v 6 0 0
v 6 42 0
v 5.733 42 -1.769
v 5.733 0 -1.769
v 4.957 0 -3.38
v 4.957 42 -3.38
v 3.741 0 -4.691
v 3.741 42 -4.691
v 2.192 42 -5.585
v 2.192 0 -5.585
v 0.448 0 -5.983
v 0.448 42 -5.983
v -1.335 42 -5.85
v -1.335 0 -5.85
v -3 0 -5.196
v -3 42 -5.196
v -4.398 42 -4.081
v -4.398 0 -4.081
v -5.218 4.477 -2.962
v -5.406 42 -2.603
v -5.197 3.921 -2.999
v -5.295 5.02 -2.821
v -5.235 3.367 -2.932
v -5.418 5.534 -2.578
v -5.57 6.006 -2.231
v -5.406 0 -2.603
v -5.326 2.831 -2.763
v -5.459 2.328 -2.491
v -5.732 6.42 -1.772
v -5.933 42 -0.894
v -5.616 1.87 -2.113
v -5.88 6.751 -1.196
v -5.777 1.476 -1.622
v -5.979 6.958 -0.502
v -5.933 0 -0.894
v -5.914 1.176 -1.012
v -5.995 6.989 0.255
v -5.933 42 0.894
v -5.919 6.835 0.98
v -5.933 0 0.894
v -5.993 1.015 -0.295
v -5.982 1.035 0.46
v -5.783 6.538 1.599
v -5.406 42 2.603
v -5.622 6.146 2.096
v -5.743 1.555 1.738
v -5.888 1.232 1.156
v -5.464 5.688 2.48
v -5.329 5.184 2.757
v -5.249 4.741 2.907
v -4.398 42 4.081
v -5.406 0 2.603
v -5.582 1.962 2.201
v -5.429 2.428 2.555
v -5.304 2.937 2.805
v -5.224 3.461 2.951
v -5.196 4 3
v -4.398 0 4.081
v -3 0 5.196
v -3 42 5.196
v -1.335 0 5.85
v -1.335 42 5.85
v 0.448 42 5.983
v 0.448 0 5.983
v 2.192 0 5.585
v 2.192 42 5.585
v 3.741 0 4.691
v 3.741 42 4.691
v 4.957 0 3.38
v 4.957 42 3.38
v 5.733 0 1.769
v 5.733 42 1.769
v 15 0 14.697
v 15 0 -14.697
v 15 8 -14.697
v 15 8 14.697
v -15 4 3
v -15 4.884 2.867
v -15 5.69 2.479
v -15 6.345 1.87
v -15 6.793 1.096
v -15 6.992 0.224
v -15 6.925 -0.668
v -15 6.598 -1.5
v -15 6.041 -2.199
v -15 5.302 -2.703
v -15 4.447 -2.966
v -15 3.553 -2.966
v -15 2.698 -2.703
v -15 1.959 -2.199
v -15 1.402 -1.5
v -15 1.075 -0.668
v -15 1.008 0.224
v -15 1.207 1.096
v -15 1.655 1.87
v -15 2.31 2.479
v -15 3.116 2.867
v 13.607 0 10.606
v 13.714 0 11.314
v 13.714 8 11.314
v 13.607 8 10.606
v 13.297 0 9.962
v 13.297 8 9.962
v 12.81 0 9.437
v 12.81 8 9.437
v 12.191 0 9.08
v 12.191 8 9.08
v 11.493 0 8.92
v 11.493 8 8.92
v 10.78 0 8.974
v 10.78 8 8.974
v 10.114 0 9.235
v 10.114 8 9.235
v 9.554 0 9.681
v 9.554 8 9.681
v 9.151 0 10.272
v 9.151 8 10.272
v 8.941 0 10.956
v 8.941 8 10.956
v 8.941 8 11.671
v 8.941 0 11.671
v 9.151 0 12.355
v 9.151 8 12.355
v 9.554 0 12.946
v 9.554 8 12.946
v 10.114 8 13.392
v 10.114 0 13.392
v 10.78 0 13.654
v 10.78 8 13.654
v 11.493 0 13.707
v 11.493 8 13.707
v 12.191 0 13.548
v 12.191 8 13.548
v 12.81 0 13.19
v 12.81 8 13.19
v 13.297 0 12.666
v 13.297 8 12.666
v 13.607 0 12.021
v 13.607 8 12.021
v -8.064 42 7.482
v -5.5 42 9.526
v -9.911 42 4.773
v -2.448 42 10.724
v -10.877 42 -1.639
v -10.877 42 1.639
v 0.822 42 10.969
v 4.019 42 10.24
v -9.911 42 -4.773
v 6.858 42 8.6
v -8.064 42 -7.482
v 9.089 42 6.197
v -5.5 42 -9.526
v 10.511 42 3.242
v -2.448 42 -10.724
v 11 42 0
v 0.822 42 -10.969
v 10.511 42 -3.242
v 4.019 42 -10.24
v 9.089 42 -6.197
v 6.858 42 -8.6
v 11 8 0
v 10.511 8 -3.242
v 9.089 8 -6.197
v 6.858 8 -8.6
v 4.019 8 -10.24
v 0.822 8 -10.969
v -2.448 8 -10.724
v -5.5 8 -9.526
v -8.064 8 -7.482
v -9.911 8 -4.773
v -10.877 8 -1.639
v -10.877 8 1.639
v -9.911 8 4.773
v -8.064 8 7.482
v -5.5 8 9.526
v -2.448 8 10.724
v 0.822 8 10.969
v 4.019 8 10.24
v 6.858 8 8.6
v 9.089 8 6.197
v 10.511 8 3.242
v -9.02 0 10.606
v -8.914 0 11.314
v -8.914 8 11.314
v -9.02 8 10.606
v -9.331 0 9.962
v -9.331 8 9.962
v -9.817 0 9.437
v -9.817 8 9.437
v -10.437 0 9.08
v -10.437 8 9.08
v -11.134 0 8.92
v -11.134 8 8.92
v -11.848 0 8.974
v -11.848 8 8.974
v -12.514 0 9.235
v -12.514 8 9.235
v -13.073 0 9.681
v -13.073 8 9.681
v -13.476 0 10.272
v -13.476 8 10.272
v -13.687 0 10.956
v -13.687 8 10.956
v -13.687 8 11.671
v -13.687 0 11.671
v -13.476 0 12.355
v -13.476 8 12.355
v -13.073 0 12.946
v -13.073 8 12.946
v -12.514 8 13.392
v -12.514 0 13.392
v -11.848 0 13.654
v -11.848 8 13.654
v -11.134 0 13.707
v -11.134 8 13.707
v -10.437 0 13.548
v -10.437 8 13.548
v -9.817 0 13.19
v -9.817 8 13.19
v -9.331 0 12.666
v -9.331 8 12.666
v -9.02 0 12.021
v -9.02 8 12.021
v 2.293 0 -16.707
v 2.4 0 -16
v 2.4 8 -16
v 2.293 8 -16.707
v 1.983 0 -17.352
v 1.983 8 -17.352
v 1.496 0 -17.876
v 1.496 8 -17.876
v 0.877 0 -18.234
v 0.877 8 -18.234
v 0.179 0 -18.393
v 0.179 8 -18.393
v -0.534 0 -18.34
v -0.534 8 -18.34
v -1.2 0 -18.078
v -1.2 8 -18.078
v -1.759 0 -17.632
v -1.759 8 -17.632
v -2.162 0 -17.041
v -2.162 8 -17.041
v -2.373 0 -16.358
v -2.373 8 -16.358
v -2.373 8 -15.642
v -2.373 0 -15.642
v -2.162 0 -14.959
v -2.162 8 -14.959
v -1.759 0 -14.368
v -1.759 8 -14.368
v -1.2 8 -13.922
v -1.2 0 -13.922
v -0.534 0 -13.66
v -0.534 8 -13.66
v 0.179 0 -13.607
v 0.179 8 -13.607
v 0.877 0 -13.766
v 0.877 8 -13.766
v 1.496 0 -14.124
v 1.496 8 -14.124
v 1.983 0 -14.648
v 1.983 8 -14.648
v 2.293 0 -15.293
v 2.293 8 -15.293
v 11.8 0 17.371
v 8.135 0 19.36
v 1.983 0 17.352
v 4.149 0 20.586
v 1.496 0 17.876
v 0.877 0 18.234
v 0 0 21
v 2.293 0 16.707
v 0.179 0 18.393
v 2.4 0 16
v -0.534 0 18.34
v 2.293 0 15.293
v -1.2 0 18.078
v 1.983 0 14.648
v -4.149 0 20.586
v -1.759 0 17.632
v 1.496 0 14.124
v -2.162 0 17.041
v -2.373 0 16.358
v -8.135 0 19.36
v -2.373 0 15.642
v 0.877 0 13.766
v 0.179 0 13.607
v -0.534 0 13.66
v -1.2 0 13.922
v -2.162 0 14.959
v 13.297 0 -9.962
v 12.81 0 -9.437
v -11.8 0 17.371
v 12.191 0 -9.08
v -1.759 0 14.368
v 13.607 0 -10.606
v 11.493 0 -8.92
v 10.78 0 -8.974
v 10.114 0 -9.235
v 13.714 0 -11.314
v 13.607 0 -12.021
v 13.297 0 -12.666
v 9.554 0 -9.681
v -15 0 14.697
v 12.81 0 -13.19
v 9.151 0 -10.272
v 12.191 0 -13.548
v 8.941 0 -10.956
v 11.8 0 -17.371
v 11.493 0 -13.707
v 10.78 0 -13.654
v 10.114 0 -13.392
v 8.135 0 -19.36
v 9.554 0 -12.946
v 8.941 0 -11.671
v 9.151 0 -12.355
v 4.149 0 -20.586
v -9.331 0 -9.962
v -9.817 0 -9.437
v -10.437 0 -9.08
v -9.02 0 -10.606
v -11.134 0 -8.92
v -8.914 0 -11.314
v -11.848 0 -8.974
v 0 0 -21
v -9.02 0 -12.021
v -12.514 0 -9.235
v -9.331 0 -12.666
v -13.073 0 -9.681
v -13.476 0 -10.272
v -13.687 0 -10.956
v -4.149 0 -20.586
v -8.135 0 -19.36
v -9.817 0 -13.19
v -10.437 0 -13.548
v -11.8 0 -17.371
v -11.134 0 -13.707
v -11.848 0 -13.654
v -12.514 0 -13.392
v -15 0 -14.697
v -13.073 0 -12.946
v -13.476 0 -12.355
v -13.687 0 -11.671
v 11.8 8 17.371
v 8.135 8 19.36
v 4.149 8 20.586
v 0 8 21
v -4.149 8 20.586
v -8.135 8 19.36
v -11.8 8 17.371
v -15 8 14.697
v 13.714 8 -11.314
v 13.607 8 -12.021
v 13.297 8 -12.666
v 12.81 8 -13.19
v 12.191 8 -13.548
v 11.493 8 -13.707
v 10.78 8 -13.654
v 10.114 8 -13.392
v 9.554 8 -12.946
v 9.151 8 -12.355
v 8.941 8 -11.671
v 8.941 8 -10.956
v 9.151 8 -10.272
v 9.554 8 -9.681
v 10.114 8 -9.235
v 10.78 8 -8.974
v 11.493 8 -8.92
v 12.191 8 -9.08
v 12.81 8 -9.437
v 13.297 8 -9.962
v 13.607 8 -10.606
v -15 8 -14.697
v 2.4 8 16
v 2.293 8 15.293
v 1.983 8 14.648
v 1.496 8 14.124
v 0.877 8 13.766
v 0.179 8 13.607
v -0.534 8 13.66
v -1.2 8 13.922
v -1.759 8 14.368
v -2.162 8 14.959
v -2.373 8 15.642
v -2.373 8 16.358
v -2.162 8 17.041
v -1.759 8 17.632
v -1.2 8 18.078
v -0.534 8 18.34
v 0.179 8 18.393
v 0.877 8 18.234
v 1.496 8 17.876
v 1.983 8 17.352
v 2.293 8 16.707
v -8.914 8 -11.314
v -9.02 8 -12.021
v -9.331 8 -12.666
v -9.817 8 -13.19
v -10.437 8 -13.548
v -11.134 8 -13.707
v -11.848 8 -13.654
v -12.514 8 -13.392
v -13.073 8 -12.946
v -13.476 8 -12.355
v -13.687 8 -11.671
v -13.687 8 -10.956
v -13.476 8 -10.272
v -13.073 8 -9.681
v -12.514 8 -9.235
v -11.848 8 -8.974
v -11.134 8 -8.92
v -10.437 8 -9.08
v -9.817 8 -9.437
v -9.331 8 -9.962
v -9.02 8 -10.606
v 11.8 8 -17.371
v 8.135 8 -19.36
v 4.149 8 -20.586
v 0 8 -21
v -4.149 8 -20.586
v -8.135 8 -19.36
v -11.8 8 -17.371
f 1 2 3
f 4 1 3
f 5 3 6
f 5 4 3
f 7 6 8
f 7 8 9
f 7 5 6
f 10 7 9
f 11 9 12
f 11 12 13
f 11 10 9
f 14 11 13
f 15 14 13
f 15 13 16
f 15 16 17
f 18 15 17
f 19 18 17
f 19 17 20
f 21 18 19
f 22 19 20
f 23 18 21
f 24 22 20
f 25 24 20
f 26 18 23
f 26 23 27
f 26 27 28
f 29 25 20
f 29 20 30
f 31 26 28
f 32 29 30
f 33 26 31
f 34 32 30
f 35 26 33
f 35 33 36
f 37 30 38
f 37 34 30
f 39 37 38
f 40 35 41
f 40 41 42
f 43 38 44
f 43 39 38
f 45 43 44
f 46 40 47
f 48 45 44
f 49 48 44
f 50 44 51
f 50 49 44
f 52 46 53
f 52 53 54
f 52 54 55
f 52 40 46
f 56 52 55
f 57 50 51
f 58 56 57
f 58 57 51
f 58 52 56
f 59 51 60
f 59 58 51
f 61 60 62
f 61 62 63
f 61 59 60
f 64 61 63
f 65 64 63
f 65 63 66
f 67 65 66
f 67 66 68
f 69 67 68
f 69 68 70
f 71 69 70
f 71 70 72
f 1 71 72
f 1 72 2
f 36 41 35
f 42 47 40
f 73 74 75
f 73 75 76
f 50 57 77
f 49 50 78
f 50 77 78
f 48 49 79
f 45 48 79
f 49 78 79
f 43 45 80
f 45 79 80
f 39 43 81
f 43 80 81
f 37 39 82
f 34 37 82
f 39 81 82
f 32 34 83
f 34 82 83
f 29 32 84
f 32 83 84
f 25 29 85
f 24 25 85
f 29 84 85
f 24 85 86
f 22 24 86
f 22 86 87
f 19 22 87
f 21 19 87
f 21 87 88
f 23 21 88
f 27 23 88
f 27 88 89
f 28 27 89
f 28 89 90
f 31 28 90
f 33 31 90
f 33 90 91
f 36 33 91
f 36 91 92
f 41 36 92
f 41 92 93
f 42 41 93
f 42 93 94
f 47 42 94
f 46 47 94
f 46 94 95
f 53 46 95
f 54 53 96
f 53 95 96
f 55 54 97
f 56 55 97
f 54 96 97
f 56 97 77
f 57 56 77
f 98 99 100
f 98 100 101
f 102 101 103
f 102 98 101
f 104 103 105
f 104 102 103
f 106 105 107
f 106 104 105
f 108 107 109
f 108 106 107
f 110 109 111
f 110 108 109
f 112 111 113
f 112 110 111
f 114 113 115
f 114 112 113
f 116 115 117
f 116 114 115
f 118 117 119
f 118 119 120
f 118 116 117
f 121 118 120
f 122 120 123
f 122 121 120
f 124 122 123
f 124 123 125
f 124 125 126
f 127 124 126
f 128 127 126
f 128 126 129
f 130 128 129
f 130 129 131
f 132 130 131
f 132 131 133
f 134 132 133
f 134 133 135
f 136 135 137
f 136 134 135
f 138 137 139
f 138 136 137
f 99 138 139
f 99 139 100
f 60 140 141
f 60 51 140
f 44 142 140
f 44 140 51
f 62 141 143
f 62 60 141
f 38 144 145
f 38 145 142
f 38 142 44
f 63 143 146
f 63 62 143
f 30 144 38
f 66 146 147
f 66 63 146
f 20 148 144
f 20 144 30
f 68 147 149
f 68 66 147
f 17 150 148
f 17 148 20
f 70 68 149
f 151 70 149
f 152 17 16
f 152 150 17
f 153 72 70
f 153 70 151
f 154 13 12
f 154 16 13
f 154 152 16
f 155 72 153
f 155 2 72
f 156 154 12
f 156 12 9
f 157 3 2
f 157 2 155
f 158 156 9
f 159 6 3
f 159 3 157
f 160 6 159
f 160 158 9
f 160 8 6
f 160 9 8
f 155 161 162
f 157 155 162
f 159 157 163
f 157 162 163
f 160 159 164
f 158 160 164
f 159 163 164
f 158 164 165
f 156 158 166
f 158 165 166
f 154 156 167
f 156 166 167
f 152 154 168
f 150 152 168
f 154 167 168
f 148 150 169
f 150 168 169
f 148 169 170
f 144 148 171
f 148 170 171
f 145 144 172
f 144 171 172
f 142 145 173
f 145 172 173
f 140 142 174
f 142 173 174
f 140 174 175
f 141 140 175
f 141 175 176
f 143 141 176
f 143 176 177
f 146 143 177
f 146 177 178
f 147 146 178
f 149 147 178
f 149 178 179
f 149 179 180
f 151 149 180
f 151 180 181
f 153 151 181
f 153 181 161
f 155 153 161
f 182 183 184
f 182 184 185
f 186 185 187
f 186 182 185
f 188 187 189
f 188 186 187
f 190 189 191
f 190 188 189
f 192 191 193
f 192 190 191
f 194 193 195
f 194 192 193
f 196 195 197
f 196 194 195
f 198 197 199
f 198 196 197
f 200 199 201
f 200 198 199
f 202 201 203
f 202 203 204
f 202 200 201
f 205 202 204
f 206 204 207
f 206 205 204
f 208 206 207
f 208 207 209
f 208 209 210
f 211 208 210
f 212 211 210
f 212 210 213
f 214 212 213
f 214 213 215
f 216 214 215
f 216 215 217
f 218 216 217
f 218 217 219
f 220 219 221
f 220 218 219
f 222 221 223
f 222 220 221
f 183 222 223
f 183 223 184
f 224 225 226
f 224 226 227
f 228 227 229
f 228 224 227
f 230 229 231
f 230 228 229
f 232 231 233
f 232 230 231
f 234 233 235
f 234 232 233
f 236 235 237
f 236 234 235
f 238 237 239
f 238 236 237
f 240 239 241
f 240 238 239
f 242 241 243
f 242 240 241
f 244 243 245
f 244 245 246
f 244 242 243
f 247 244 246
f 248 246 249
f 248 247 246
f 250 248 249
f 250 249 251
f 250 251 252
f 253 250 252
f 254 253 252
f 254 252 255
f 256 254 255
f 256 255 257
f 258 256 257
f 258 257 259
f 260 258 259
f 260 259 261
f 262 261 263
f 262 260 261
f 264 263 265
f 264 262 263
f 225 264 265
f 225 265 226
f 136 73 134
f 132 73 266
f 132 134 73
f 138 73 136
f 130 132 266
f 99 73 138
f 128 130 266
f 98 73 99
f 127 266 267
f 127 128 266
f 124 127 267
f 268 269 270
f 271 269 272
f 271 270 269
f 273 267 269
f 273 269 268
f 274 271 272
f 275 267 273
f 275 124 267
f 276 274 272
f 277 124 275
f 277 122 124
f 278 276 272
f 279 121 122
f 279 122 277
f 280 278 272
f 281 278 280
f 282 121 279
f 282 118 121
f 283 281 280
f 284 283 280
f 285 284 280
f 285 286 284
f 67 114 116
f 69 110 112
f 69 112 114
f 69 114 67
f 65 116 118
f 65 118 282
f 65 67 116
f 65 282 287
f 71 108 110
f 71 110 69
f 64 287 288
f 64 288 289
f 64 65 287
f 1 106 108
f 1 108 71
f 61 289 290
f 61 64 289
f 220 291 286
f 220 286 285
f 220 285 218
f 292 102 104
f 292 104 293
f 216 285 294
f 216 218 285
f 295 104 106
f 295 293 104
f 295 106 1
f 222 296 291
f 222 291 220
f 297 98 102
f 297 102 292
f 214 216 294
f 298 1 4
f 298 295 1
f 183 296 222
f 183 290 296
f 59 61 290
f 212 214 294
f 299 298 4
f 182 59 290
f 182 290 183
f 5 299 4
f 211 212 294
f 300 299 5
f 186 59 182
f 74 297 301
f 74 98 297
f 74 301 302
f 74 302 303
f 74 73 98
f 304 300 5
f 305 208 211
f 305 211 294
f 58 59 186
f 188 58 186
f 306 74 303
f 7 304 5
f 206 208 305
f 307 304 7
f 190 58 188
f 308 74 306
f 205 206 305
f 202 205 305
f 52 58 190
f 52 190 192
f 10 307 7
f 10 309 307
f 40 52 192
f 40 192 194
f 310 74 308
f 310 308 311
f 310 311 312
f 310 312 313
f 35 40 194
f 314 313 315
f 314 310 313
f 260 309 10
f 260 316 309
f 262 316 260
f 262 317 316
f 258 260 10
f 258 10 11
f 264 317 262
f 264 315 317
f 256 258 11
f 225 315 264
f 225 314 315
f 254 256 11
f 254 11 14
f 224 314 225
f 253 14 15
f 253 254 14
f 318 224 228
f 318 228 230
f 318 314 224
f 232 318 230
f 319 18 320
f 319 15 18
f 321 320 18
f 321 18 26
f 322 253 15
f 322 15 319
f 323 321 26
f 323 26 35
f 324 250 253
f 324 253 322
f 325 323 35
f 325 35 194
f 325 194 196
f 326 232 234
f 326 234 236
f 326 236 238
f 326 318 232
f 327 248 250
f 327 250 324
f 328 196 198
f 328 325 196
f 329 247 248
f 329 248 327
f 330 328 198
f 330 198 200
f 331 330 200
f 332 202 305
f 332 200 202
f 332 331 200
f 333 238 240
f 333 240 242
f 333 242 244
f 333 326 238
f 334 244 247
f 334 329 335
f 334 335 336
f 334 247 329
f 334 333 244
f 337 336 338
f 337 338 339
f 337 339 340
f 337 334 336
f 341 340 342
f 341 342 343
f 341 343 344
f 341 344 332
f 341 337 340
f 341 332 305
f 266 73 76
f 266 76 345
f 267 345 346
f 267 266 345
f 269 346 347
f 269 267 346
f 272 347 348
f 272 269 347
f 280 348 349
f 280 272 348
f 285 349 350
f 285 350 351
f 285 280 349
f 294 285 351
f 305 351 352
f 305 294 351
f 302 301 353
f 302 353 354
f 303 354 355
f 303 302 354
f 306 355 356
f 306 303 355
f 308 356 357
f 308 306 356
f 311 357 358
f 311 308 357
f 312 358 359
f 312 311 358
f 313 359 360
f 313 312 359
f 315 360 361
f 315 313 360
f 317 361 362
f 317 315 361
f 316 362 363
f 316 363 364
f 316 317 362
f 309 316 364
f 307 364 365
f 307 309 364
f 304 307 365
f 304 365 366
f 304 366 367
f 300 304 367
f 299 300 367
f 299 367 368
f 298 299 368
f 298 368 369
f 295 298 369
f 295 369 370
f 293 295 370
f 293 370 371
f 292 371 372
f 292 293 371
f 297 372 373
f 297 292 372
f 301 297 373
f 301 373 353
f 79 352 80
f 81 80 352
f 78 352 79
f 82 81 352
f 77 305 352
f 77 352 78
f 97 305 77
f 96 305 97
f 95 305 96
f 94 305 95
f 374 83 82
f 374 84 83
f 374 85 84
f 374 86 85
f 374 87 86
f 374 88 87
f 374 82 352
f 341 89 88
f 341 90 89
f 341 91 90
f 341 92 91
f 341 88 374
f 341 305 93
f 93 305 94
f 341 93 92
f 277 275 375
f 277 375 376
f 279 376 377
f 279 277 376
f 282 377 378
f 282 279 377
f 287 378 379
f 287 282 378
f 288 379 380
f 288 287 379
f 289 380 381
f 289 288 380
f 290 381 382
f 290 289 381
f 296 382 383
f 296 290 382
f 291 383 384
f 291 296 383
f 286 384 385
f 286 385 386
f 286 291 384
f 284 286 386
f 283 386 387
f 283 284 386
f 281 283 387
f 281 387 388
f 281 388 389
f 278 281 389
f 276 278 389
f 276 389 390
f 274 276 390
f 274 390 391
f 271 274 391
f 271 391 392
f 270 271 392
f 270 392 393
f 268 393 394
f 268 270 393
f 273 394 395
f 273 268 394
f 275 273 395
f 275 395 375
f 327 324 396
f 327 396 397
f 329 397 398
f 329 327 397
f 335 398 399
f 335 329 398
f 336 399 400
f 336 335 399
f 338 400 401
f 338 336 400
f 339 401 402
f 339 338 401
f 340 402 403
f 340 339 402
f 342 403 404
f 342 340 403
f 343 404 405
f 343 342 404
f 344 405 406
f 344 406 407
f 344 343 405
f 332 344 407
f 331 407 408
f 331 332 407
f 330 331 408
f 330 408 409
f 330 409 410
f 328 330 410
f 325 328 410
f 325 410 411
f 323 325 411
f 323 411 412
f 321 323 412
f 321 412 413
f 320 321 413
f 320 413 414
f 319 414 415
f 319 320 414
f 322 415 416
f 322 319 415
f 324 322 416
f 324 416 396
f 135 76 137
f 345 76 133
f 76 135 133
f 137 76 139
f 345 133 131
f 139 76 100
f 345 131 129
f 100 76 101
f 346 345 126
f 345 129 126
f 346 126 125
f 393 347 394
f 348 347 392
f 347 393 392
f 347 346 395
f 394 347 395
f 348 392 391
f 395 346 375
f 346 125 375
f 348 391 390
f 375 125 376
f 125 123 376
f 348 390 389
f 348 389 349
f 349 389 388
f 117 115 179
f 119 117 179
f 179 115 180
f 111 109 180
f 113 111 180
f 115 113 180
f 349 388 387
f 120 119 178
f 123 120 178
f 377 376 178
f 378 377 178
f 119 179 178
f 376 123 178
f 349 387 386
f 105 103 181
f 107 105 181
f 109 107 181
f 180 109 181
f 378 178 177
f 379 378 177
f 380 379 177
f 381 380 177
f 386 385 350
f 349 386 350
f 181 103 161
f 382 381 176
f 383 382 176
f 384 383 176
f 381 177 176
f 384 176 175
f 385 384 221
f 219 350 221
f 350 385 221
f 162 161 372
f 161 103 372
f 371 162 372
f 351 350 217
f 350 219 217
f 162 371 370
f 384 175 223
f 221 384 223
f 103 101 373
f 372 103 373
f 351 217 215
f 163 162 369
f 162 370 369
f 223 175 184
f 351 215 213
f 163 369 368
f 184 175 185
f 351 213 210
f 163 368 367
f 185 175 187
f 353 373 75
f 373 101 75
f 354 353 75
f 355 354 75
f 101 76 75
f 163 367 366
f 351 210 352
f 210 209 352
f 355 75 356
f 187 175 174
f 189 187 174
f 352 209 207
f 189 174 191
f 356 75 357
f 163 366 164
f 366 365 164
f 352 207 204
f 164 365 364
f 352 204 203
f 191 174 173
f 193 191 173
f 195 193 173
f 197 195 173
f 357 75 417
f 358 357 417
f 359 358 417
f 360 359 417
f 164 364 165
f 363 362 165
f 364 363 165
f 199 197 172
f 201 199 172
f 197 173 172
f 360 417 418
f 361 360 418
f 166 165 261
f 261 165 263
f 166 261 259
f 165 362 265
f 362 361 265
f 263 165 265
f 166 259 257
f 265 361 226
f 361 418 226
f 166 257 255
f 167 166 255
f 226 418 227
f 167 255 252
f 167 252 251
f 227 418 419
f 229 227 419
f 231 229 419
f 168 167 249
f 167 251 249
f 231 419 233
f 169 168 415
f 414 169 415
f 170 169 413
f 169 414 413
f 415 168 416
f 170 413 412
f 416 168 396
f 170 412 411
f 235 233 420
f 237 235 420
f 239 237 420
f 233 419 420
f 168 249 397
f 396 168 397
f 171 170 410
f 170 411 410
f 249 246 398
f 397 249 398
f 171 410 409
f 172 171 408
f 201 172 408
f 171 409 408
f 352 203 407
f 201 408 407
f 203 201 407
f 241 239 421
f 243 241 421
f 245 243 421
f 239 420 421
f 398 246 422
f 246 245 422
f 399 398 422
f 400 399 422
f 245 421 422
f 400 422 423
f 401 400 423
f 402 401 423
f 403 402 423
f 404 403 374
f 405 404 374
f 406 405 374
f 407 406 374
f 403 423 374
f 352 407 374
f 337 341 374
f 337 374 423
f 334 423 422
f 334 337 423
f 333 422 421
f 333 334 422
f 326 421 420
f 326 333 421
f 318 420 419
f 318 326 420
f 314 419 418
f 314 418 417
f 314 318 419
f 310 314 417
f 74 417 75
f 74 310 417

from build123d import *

# Parameters (mm, degrees)
SKETCH_1_R          = 2.4
SKETCH_1_R_2        = 11
EXTRUDE_1_DEPTH     = 8
SKETCH_1_3_R        = 11
SKETCH_1_3_R_2      = 6
EXTRUDE_2_DEPTH     = 42
SKETCH_2_R          = 3
CUT_EXTRUDE_1_DEPTH = 20


with BuildPart() as part:
    # 草图1 → 凸台-拉伸1 (new body)
    with BuildSketch(Plane(origin=(0, 0, 0), x_dir=(1, 0, 0), z_dir=(0, 1, 0))):
        with BuildLine():
            ThreePointArc((15, 14.696938457), (0, 21), (-15, 14.696938457))
            Line((-15, 14.696938457), (-15, -14.696938457))
            ThreePointArc((-15, -14.696938457), (0, -21), (15, -14.696938457))
            Line((15, -14.696938457), (15, 14.696938457))
        make_face()
        with Locations((-11.313708499, -11.313708499)):
            Circle(SKETCH_1_R, mode=Mode.SUBTRACT)
        with Locations((0, -16)):
            Circle(SKETCH_1_R, mode=Mode.SUBTRACT)
        with Locations((11.313708499, -11.313708499)):
            Circle(SKETCH_1_R, mode=Mode.SUBTRACT)
        with Locations((-11.313708499, 11.313708499)):
            Circle(SKETCH_1_R, mode=Mode.SUBTRACT)
        Circle(SKETCH_1_R_2, mode=Mode.SUBTRACT)
        with Locations((0, 16)):
            Circle(SKETCH_1_R, mode=Mode.SUBTRACT)
        with Locations((11.313708499, 11.313708499)):
            Circle(SKETCH_1_R, mode=Mode.SUBTRACT)
    extrude(amount=EXTRUDE_1_DEPTH)

    # 草图1<3> → 凸台-拉伸2 (add)
    with BuildSketch(Plane(origin=(0, 0, 0), x_dir=(1, 0, 0), z_dir=(0, 1, 0))):
        Circle(SKETCH_1_3_R)
        Circle(SKETCH_1_3_R_2, mode=Mode.SUBTRACT)
    extrude(amount=EXTRUDE_2_DEPTH)

    # 草图2 → 切除-拉伸1 (cut)
    with BuildSketch(Plane.ZY.offset(15)):
        with Locations((0, 4)):
            Circle(SKETCH_2_R)
    extrude(amount=-CUT_EXTRUDE_1_DEPTH, mode=Mode.SUBTRACT)


solid = part.part
